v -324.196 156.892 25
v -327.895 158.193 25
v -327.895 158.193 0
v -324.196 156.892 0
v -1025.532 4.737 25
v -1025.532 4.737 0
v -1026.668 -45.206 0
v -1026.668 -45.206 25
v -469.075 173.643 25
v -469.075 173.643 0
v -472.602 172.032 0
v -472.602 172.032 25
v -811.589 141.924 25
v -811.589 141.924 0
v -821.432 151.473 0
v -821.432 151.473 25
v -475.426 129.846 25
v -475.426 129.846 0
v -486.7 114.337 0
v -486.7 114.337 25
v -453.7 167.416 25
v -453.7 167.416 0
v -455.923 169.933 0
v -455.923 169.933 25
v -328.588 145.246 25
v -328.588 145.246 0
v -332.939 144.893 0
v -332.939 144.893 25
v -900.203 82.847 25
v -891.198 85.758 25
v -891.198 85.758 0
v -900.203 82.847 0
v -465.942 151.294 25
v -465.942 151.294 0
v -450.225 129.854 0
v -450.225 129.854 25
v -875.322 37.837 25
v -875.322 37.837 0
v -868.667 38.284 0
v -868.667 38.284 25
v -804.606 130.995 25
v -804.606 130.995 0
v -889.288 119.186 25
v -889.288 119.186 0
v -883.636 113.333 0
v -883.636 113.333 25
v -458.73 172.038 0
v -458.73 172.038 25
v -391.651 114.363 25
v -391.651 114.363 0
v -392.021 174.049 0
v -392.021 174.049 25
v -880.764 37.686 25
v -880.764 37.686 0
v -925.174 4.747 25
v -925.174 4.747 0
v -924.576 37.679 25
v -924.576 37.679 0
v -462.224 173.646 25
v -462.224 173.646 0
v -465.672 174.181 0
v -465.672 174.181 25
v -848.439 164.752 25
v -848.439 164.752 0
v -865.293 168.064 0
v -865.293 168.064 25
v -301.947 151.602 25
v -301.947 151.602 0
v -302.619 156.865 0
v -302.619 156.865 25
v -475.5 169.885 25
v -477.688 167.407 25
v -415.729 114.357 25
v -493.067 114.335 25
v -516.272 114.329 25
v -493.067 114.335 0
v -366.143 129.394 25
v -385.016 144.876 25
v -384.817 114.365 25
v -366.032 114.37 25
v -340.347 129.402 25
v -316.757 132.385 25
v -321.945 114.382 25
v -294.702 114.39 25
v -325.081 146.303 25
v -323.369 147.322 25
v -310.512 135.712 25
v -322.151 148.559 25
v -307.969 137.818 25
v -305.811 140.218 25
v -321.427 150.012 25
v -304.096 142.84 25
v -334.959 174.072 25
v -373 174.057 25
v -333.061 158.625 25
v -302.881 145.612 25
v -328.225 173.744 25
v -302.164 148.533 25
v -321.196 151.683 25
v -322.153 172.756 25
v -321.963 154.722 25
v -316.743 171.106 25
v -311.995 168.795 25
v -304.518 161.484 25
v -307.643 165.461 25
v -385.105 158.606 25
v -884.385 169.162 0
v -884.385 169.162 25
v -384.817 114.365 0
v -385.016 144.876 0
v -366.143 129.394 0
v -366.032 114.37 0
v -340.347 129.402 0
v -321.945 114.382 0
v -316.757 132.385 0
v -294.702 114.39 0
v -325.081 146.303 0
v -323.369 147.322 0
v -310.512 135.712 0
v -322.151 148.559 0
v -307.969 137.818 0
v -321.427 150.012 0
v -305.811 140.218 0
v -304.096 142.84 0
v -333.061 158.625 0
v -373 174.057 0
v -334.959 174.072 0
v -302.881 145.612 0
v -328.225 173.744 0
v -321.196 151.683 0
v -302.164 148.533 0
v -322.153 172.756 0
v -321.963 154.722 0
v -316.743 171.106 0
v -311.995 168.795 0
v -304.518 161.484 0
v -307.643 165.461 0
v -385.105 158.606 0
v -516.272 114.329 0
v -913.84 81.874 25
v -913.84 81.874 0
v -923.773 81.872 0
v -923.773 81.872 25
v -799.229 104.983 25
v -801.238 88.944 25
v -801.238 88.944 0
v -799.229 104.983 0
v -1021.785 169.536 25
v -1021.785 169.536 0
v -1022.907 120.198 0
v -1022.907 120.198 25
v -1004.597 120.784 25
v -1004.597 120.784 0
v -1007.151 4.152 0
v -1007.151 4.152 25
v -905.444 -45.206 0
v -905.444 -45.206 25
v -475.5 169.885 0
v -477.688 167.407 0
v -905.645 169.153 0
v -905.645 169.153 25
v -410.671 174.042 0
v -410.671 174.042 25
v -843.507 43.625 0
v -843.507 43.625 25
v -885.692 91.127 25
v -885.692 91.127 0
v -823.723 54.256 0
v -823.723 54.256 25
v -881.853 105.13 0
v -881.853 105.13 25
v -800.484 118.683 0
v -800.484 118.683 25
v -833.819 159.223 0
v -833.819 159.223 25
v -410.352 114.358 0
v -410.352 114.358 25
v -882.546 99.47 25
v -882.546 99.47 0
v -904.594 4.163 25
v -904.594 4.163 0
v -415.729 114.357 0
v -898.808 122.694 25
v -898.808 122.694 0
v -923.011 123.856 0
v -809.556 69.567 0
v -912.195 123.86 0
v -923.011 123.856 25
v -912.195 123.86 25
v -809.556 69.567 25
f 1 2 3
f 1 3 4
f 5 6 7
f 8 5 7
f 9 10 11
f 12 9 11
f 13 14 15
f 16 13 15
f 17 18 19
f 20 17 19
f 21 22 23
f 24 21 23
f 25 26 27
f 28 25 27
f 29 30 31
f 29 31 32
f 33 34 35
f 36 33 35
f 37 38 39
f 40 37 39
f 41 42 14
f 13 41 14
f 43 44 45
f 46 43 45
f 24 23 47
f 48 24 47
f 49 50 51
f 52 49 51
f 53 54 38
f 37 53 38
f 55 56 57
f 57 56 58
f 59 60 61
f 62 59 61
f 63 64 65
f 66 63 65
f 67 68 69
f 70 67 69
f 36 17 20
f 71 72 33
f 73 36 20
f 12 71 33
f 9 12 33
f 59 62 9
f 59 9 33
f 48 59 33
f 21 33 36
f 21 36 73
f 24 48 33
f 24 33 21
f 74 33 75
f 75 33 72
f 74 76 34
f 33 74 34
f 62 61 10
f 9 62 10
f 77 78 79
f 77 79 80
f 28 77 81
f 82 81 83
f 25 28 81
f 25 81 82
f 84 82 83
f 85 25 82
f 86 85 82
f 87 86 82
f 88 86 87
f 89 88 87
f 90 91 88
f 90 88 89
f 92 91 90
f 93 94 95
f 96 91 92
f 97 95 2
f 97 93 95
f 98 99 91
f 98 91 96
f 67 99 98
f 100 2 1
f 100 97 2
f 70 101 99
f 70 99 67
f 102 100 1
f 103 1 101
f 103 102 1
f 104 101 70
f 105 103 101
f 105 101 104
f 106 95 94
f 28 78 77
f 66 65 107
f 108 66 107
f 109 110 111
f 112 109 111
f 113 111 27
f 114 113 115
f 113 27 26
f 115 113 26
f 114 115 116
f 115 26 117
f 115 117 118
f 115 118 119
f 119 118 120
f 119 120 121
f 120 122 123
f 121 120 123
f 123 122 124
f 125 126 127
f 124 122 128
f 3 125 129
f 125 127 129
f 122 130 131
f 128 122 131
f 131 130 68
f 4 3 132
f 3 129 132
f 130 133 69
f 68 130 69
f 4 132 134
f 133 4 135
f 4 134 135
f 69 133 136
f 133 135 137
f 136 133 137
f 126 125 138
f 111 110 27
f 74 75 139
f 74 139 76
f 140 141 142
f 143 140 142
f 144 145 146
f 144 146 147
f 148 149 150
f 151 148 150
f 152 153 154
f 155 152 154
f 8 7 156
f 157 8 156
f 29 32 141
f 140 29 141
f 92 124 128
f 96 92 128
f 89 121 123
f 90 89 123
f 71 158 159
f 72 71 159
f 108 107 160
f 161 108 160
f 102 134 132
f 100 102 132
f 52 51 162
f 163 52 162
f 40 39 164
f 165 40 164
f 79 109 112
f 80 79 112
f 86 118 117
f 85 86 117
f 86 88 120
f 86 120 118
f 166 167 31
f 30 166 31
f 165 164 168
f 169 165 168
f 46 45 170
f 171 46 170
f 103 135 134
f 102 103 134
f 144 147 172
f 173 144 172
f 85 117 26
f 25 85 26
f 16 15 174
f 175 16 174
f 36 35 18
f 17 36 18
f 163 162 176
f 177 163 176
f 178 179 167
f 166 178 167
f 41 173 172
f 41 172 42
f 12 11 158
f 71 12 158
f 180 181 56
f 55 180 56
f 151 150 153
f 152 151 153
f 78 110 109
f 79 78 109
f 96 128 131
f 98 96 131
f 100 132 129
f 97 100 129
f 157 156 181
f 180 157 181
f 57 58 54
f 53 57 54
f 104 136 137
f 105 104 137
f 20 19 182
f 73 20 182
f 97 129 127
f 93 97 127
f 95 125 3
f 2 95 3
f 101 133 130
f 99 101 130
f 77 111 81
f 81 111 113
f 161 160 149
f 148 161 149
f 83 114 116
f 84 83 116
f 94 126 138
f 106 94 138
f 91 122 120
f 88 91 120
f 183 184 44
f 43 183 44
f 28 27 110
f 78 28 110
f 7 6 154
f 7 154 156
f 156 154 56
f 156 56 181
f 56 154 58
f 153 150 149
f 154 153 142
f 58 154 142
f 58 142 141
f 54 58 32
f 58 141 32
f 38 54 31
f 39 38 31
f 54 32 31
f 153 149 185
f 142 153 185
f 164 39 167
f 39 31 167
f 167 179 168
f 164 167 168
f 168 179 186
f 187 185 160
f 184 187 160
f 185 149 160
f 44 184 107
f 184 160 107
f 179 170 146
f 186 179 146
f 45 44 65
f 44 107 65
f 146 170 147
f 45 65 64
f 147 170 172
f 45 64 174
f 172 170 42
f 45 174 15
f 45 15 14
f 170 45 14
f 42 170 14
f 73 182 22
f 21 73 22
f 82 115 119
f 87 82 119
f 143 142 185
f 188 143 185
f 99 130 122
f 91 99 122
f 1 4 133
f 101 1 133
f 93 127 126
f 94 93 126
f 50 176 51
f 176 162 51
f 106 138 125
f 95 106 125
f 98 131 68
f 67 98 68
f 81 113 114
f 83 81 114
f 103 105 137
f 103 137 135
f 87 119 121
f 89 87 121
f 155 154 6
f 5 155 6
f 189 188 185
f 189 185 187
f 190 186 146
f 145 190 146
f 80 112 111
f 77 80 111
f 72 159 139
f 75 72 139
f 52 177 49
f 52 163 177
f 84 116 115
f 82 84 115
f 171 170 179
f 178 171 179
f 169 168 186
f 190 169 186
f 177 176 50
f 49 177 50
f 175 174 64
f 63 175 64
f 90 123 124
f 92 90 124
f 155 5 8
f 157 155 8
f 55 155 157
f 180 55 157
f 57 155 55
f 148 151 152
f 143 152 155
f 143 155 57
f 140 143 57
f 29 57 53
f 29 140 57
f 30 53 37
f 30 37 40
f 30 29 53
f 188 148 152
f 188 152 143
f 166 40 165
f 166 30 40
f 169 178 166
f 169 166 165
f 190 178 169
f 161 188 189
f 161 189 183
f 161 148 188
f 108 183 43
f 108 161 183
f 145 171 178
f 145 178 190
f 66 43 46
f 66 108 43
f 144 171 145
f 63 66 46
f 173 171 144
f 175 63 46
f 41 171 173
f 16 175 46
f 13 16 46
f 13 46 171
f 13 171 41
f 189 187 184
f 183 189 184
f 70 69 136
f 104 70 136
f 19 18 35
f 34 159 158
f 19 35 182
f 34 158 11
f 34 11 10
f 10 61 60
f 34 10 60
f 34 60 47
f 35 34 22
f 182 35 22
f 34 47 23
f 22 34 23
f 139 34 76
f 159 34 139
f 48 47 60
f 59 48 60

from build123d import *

# Parameters (mm, degrees)
F1_DEPTH = 25


with BuildPart() as f1:
    # F0 (on Top) → F1 (new body)
    with BuildSketch(Plane.XY):
        Polygon((-1007.151407, 4.152373), (-1025.532487, 4.736784), (-1026.668174, -45.205807), (-905.444192, -45.205807), (-904.593988, 4.162568), (-925.174164, 4.746879), (-924.57608, 37.679079), (-880.76416, 37.686391), (-875.322385, 37.836883), (-868.666895, 38.284458), (-843.507275, 43.625111), (-823.722857, 54.255914), (-809.555843, 69.566723), (-801.238482, 88.94377), (-799.22862, 104.982731), (-800.48393, 118.682817), (-804.60563, 130.995015), (-811.589498, 141.923824), (-821.432302, 151.473252), (-833.819435, 159.22263), (-848.438879, 164.751842), (-865.293001, 168.064389), (-884.385467, 169.162481), (-905.64524, 169.153305), (-1021.784968, 169.536265), (-1022.90692, 120.197707), (-1004.597102, 120.783872), align=None)
        Polygon((-900.202569, 82.84746), (-913.84045, 81.874263), (-923.773496, 81.871721), (-923.011008, 123.856481), (-912.195127, 123.860164), (-898.807743, 122.69444), (-889.288447, 119.185991), (-883.636486, 113.332501), (-881.853421, 105.130246), (-882.545937, 99.470344), (-885.692, 91.126976), (-891.198475, 85.758439), align=None, mode=Mode.SUBTRACT)
        Polygon((-475.426065, 129.846204), (-486.699862, 114.337183), (-415.729295, 114.356671), (-453.699945, 167.415701), (-455.923418, 169.933403), (-458.730012, 172.037501), (-462.223687, 173.64603), (-465.672015, 174.181246), (-469.075192, 173.643331), (-472.601707, 172.032083), (-475.500059, 169.884586), (-477.688188, 167.406553), (-516.271662, 114.329062), (-493.066648, 114.335434), (-465.94181, 151.294482), (-450.224641, 129.853911), align=None)
        Polygon((-410.352202, 114.358149), (-391.651032, 114.363284), (-392.021399, 174.049138), (-410.671429, 174.041778), align=None)
        Polygon((-321.945321, 114.382425), (-294.701844, 114.389906), (-316.757065, 132.384585), (-310.512316, 135.71203), (-307.968738, 137.817866), (-305.811038, 140.218224), (-304.09606, 142.840453), (-302.880567, 145.61195), (-302.164399, 148.532593), (-301.947378, 151.602254), (-302.618978, 156.865058), (-304.517845, 161.484258), (-307.643338, 165.460645), (-311.995016, 168.794904), (-316.743166, 171.105919), (-322.152969, 172.755524), (-328.224725, 173.744038), (-334.958846, 174.071658), (-373.00009, 174.056644), (-385.105149, 158.605878), (-333.061497, 158.6248), (-327.895314, 158.192658), (-324.195751, 156.891824), (-321.962695, 154.721981), (-321.196356, 151.682616), (-321.426501, 150.012321), (-322.150612, 148.558833), (-323.368762, 147.322243), (-325.080992, 146.302626), (-328.588142, 145.246365), (-332.939189, 144.893189), (-385.015651, 144.875693), (-384.816774, 114.36516), (-366.031828, 114.370319), (-366.142684, 129.394024), (-340.346745, 129.401887), align=None)
    extrude(amount=F1_DEPTH)


solid = f1.part
